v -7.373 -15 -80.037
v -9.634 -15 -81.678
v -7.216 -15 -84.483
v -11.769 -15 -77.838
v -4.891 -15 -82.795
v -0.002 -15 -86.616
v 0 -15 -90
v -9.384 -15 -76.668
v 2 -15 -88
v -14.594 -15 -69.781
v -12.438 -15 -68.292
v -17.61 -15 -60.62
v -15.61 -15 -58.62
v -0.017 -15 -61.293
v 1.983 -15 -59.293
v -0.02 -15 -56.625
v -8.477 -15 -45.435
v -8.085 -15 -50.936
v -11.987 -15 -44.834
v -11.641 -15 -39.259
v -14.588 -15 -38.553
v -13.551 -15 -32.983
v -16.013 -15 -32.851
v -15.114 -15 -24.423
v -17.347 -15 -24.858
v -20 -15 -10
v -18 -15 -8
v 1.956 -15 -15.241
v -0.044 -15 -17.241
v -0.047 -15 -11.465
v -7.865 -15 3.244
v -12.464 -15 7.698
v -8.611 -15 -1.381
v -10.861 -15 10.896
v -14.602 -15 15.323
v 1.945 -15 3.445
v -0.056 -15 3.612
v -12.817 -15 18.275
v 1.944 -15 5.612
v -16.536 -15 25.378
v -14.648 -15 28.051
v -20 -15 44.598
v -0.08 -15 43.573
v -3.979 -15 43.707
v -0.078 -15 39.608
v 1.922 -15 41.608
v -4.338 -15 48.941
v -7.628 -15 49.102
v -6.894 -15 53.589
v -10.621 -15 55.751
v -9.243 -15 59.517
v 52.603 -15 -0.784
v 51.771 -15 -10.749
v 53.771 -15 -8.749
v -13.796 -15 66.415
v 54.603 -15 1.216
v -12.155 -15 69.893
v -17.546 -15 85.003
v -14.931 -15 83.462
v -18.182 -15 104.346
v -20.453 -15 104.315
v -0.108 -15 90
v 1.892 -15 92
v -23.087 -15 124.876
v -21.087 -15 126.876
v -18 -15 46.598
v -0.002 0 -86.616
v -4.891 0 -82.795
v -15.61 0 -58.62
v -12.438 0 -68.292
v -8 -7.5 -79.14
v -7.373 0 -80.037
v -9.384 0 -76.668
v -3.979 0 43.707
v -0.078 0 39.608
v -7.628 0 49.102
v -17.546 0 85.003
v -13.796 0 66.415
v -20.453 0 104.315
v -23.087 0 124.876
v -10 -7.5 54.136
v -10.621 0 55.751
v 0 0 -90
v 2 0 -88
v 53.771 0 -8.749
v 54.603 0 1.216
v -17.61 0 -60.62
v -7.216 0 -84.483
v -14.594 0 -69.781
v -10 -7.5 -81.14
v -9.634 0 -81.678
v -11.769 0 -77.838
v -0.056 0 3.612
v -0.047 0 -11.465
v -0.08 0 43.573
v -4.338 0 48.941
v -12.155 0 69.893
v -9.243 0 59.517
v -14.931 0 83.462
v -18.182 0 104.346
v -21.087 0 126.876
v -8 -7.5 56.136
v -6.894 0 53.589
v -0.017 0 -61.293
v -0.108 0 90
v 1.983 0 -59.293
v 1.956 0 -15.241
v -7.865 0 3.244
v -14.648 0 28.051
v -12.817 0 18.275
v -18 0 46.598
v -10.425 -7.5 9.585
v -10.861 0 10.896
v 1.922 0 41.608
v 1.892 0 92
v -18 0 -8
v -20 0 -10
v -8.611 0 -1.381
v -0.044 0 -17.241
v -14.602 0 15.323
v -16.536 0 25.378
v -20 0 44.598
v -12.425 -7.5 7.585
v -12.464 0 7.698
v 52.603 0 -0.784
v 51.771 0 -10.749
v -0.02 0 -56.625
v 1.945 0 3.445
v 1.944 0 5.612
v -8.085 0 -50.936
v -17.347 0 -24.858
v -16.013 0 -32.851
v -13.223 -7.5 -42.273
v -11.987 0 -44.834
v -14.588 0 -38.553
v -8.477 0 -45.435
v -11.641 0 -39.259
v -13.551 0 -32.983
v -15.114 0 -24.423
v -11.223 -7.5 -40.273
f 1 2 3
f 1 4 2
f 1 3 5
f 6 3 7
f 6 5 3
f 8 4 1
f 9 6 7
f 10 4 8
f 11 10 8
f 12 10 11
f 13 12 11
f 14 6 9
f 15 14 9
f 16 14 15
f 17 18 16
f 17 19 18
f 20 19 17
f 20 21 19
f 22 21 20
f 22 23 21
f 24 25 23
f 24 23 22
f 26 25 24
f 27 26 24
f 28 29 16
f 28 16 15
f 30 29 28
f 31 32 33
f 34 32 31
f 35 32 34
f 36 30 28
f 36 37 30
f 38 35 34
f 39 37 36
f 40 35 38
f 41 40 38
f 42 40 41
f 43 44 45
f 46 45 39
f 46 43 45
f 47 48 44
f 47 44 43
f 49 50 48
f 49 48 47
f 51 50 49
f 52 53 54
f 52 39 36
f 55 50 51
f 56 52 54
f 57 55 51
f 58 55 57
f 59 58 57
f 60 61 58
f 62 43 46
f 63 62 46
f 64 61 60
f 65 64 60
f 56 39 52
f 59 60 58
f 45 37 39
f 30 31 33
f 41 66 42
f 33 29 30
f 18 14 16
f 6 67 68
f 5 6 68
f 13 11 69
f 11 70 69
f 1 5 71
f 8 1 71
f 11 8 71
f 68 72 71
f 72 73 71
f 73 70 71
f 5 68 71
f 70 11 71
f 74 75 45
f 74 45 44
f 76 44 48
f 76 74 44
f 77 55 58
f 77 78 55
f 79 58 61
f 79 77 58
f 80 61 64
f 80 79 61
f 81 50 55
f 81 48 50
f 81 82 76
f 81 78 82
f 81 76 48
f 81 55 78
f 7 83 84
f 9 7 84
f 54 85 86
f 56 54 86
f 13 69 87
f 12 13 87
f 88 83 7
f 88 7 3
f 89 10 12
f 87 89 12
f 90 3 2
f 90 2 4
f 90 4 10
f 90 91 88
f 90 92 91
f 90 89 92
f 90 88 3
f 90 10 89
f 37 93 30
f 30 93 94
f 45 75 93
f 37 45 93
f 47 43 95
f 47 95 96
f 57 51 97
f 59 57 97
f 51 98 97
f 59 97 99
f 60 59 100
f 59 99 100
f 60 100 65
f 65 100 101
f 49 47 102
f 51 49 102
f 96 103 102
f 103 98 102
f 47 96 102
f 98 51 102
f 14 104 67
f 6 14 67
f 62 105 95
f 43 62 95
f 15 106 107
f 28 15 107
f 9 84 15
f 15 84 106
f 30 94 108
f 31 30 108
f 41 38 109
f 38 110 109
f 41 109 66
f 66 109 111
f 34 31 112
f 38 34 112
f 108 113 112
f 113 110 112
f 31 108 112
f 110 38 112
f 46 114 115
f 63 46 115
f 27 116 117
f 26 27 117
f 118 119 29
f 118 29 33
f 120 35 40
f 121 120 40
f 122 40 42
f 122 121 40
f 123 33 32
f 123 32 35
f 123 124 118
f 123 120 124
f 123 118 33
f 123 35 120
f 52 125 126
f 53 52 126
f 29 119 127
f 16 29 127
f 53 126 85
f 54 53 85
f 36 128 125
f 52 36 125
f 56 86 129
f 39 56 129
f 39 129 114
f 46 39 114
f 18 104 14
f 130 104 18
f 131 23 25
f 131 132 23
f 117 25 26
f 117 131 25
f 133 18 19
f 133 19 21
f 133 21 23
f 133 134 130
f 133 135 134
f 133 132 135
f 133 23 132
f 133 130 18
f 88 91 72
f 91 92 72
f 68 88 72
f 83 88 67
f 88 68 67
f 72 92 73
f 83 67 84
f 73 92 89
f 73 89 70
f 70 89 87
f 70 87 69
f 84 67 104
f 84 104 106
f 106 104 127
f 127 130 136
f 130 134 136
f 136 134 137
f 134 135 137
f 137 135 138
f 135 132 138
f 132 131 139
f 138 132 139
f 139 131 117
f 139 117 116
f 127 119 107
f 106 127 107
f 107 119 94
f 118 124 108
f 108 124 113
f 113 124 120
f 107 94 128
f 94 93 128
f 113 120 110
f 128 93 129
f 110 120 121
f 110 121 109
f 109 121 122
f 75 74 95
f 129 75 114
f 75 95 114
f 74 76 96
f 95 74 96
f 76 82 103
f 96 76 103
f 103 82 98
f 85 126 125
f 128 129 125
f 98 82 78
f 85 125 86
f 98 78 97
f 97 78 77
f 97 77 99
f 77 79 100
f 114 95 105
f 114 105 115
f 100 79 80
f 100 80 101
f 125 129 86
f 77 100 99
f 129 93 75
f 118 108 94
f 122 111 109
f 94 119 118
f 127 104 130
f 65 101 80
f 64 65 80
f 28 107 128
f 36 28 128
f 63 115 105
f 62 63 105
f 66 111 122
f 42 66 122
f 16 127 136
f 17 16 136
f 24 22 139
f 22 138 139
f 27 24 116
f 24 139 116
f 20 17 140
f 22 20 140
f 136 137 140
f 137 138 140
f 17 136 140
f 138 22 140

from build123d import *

# Parameters (mm, degrees)
F1_DEPTH = 15


with BuildPart() as f1:
    # F0 (on Front) → F1 (new body)
    with BuildSketch(Plane.XZ):
        with BuildLine():
            Line((0, -90), (-0.0020318986, -86.6158458051))
            add(Edge.make_bspline(
                [(-0.0020318986, -86.6158458051), (-2.9502442041, -84.5666168129), (-10.4928577407, -78.9197373079), (-12.6269030842, -66.4474399981), (-15.6103040576, -58.6201291084)],
                knots=[0.0811961622, 0.0811961622, 0.0811961622, 0.0811961622, 0.4386135929, 1, 1, 1, 1], degree=3))
            Line((-15.6103040576, -58.6201291084), (-17.6103040576, -60.6201291084))
            add(Edge.make_bspline(
                [(0, -90), (-3.574900176, -87.5113609623), (-12.3042687462, -82.0219341359), (-14.6269030842, -68.4474399981), (-17.6103040576, -60.6201291084)],
                knots=[0, 0, 0, 0, 0.4386135929, 1, 1, 1, 1], degree=3))
        make_face()
        with BuildLine():
            Line((-0.01723641, -61.292529125), (-0.0200385849, -56.6254693835))
            add(Edge.make_bspline(
                [(-0.0200385849, -56.6254693835), (-3.6887717396, -51.9645114707), (-15.2268192201, -39.1995831189), (-15.1308750191, -19.5421248357), (-18, -8)],
                knots=[0.074505527, 0.074505527, 0.074505527, 0.074505527, 0.4559151981, 1, 1, 1, 1], degree=3))
            Line((-18, -8), (-20, -10))
            add(Edge.make_bspline(
                [(-0.01723641, -61.292529125), (-3.7556680649, -55.9750846321), (-17.2345430623, -42.7820769442), (-17.1308750191, -21.5421248357), (-20, -10)],
                knots=[0, 0, 0, 0, 0.4559151981, 1, 1, 1, 1], degree=3))
        make_face()
        with BuildLine():
            add(Edge.make_bspline(
                [(-0.0778189226, 39.6084542304), (-3.6826029225, 42.9648597076), (-14.0064909417, 54.9055102531), (-19.6294464583, 96.7072776634), (-23.0870526284, 124.876447022)],
                knots=[0, 0, 0, 0, 0.3308872096, 1, 1, 1, 1], degree=3))
            Line((-0.0778189226, 39.6084542304), (-0.0801995262, 43.5733814298))
            add(Edge.make_bspline(
                [(-0.0801995262, 43.5733814298), (-2.9434791077, 46.558615577), (-12.3547735456, 59.4946874854), (-17.6294464583, 98.7072776634), (-21.0870526284, 126.876447022)],
                knots=[0.0619394201, 0.0619394201, 0.0619394201, 0.0619394201, 0.3308872096, 1, 1, 1, 1], degree=3))
            Line((-21.0870526284, 126.876447022), (-23.0870526284, 124.876447022))
        make_face()
        with BuildLine():
            add(Edge.make_bspline(
                [(1.98276359, -59.292529125), (1.3718301933, -58.4235539167), (0.6966210014, -57.5359526563), (-0.0200385849, -56.6254693835)],
                knots=[0, 0, 0, 0, 0.074505527, 0.074505527, 0.074505527, 0.074505527], degree=3))
            Line((-0.0200385849, -56.6254693835), (-0.01723641, -61.292529125))
            Line((-0.01723641, -61.292529125), (-0.0020318986, -86.6158458051))
            add(Edge.make_bspline(
                [(2, -88), (1.3382143662, -87.5393030625), (0.6677270556, -87.0813785838), (-0.0020318986, -86.6158458051)],
                knots=[0, 0, 0, 0, 0.0811961622, 0.0811961622, 0.0811961622, 0.0811961622], degree=3))
            Line((2, -88), (1.98276359, -59.292529125))
        make_face()
        with BuildLine():
            Line((-0.0436855326, -17.2411623467), (-0.0471535801, -11.4650829107))
            add(Edge.make_bspline(
                [(-0.0471535801, -11.4650829107), (-3.4924642294, -5.2007687498), (-13.6650261124, 11.4880544453), (-15.0273097595, 33.4830225824), (-18, 46.5982962847)],
                knots=[0.0786116183, 0.0786116183, 0.0786116183, 0.0786116183, 0.4614694467, 1, 1, 1, 1], degree=3))
            Line((-18, 46.5982962847), (-20, 44.5982962847))
            add(Edge.make_bspline(
                [(-0.0436855326, -17.2411623467), (-3.692513195, -10.0098797985), (-15.5487979027, 7.6114733276), (-17.0273097595, 31.4830225824), (-20, 44.5982962847)],
                knots=[0, 0, 0, 0, 0.4614694467, 1, 1, 1, 1], degree=3))
        make_face()
        with BuildLine():
            Line((1.9450952305, 3.4446264209), (-0.0562058927, 3.6116645843))
            Line((-0.0562058927, 3.6116645843), (-0.0471535801, -11.4650829107))
            add(Edge.make_bspline(
                [(1.9563144674, -15.2411623467), (1.3347343186, -14.0093086945), (0.6602668394, -12.7513250533), (-0.0471535801, -11.4650829107)],
                knots=[0, 0, 0, 0, 0.0786116183, 0.0786116183, 0.0786116183, 0.0786116183], degree=3))
            Line((1.9563144674, -15.2411623467), (1.9450952305, 3.4446264209))
        make_face()
        with BuildLine():
            add(Edge.make_bspline(
                [(1.9563144674, -15.2411623467), (1.3347343186, -14.0093086945), (0.6602668394, -12.7513250533), (-0.0471535801, -11.4650829107)],
                knots=[0, 0, 0, 0, 0.0786116183, 0.0786116183, 0.0786116183, 0.0786116183], degree=3))
            Line((-0.0471535801, -11.4650829107), (-0.0436855326, -17.2411623467))
            Line((-0.0436855326, -17.2411623467), (-0.0200385849, -56.6254693835))
            add(Edge.make_bspline(
                [(1.98276359, -59.292529125), (1.3718301933, -58.4235539167), (0.6966210014, -57.5359526563), (-0.0200385849, -56.6254693835)],
                knots=[0, 0, 0, 0, 0.074505527, 0.074505527, 0.074505527, 0.074505527], degree=3))
            Line((1.98276359, -59.292529125), (1.9563144674, -15.2411623467))
        make_face()
        with BuildLine():
            Line((-0.1080747673, 89.9999675551), (-0.0801995262, 43.5733814298))
            add(Edge.make_bspline(
                [(1.9221810774, 41.6084542304), (1.2473945519, 42.2367462974), (0.579221684, 42.8858737457), (-0.0801995262, 43.5733814298)],
                knots=[0, 0, 0, 0, 0.0619394201, 0.0619394201, 0.0619394201, 0.0619394201], degree=3))
            Line((1.9221810774, 41.6084542304), (1.8919252327, 91.9999675551))
            Line((1.8919252327, 91.9999675551), (-0.1080747673, 89.9999675551))
        make_face()
        Polygon((1.9437941073, 5.6116645843), (1.9450952305, 3.4446264209), (52.6029056818, -0.7835167228), (51.7711499852, -10.7488658116), (53.7711499852, -8.7488658116), (54.6029056818, 1.2164832772), align=None)
        with BuildLine():
            Line((-0.0801995262, 43.5733814298), (-0.0778189226, 39.6084542304))
            Line((-0.0778189226, 39.6084542304), (-0.0562058927, 3.6116645843))
            Line((-0.0562058927, 3.6116645843), (1.9450952305, 3.4446264209))
            Line((1.9450952305, 3.4446264209), (1.9437941073, 5.6116645843))
            Line((1.9437941073, 5.6116645843), (1.9221810774, 41.6084542304))
            add(Edge.make_bspline(
                [(1.9221810774, 41.6084542304), (1.2473945519, 42.2367462974), (0.579221684, 42.8858737457), (-0.0801995262, 43.5733814298)],
                knots=[0, 0, 0, 0, 0.0619394201, 0.0619394201, 0.0619394201, 0.0619394201], degree=3))
        make_face()
        with BuildLine():
            Line((0, -90), (2, -88))
            add(Edge.make_bspline(
                [(2, -88), (1.3382143662, -87.5393030625), (0.6677270556, -87.0813785838), (-0.0020318986, -86.6158458051)],
                knots=[0, 0, 0, 0, 0.0811961622, 0.0811961622, 0.0811961622, 0.0811961622], degree=3))
            Line((-0.0020318986, -86.6158458051), (0, -90))
        make_face()
    extrude(amount=F1_DEPTH)


solid = f1.part
